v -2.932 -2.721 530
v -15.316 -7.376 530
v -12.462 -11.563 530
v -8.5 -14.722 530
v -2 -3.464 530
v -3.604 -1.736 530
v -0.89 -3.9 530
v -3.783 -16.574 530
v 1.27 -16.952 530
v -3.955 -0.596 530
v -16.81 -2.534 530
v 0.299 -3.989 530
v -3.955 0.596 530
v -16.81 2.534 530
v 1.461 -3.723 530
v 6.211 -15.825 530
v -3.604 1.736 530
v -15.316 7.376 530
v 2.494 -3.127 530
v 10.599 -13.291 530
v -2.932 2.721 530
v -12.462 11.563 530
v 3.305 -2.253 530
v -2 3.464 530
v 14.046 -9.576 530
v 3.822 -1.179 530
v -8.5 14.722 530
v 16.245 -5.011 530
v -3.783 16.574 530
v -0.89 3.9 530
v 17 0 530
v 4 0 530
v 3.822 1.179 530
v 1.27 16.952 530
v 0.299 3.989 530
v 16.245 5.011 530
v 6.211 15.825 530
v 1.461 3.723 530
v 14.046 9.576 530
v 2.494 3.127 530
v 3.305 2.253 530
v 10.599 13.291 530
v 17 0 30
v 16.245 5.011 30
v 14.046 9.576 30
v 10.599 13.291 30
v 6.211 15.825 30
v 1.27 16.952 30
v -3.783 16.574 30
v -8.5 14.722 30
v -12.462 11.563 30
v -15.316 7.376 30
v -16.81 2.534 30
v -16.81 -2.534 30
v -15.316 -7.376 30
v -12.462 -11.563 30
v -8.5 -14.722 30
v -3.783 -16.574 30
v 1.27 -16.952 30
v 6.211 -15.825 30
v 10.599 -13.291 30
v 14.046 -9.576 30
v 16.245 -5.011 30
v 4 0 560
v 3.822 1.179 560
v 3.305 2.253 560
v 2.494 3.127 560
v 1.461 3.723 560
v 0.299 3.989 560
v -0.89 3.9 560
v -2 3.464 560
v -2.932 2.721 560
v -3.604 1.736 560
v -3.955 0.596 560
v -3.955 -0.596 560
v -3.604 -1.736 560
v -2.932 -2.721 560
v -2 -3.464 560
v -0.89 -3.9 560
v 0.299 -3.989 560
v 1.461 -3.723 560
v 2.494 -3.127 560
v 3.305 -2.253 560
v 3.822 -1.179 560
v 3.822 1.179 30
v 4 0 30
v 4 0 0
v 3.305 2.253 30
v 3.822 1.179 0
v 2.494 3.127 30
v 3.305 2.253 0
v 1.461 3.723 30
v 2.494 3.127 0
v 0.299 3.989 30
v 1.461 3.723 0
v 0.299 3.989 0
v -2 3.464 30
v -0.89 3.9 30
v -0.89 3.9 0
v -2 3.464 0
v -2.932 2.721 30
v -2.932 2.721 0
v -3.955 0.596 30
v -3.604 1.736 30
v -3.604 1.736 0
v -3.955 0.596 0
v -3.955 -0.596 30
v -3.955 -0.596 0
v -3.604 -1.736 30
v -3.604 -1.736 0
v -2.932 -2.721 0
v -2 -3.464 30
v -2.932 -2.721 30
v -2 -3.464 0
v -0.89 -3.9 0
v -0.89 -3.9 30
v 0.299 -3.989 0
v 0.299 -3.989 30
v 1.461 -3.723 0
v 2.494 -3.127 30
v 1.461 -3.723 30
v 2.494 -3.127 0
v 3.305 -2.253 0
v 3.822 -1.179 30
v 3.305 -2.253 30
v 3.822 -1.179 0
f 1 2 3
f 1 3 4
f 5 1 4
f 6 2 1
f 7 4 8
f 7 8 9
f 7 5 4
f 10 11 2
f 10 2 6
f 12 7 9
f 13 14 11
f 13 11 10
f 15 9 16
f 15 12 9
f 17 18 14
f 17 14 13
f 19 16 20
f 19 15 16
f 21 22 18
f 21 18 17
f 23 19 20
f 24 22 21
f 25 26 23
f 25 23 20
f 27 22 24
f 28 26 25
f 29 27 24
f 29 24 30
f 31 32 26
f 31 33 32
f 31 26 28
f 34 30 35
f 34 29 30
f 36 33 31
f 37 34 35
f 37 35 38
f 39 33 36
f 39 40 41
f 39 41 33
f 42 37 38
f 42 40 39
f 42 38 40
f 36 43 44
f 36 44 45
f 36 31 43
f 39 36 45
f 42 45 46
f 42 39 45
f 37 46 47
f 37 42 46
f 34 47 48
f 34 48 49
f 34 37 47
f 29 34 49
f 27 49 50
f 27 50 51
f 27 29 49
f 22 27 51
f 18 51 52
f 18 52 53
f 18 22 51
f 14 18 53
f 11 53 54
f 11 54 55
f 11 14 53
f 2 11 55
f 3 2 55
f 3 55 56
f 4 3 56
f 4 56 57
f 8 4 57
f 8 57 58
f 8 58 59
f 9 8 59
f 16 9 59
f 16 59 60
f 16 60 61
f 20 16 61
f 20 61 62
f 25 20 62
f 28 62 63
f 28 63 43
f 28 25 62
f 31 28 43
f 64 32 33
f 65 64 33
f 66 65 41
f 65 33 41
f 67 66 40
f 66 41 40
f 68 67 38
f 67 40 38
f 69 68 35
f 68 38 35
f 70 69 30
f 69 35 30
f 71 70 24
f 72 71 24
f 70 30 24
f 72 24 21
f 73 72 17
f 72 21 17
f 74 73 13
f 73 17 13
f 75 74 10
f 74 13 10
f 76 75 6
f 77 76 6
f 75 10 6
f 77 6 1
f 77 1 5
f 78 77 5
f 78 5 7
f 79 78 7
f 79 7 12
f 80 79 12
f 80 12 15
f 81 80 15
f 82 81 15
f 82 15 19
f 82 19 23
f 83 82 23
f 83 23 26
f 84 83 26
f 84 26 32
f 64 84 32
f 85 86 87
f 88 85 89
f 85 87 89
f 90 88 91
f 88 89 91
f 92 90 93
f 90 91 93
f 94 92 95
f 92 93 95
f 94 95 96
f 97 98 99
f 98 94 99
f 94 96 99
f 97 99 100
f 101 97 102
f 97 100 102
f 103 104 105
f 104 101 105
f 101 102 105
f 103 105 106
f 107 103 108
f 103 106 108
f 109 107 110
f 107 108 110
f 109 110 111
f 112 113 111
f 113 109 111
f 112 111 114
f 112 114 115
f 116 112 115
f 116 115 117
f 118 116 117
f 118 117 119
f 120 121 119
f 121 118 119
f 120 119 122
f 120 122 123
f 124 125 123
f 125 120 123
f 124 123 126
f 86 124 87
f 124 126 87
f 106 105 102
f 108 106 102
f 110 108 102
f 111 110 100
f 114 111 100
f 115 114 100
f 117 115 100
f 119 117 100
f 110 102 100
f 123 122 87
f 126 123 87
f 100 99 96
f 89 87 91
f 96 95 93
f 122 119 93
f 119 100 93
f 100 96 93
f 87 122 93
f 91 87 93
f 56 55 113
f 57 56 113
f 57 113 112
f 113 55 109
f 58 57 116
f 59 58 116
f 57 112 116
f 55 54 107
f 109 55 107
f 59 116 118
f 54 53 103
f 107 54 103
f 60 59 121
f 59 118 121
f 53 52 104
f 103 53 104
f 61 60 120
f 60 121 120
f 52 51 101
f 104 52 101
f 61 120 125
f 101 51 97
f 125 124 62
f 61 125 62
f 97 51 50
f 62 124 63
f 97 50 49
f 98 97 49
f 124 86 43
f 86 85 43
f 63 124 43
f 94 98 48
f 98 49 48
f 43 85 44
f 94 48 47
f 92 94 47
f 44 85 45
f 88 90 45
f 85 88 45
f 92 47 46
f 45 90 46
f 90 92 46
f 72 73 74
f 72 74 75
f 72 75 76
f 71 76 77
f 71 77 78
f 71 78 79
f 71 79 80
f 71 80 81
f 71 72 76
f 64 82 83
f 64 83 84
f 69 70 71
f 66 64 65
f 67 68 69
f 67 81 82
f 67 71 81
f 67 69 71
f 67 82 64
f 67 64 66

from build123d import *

# Parameters (mm, degrees)
SKETCH1_R           = 4
BOSS_EXTRUDE1_DEPTH = 560
SKETCH2_R           = 17
BOSS_EXTRUDE2_DEPTH = 250


with BuildPart() as part:
    # Sketch1 → Boss-Extrude1 (new body)
    with BuildSketch(Plane.XY):
        Circle(SKETCH1_R)
    extrude(amount=BOSS_EXTRUDE1_DEPTH)

    # Sketch2 → Boss-Extrude2 (add, symmetric)
    with BuildSketch(Plane.XY.offset(280)):
        Circle(SKETCH2_R)
    extrude(amount=BOSS_EXTRUDE2_DEPTH, both=True)


solid = part.part
